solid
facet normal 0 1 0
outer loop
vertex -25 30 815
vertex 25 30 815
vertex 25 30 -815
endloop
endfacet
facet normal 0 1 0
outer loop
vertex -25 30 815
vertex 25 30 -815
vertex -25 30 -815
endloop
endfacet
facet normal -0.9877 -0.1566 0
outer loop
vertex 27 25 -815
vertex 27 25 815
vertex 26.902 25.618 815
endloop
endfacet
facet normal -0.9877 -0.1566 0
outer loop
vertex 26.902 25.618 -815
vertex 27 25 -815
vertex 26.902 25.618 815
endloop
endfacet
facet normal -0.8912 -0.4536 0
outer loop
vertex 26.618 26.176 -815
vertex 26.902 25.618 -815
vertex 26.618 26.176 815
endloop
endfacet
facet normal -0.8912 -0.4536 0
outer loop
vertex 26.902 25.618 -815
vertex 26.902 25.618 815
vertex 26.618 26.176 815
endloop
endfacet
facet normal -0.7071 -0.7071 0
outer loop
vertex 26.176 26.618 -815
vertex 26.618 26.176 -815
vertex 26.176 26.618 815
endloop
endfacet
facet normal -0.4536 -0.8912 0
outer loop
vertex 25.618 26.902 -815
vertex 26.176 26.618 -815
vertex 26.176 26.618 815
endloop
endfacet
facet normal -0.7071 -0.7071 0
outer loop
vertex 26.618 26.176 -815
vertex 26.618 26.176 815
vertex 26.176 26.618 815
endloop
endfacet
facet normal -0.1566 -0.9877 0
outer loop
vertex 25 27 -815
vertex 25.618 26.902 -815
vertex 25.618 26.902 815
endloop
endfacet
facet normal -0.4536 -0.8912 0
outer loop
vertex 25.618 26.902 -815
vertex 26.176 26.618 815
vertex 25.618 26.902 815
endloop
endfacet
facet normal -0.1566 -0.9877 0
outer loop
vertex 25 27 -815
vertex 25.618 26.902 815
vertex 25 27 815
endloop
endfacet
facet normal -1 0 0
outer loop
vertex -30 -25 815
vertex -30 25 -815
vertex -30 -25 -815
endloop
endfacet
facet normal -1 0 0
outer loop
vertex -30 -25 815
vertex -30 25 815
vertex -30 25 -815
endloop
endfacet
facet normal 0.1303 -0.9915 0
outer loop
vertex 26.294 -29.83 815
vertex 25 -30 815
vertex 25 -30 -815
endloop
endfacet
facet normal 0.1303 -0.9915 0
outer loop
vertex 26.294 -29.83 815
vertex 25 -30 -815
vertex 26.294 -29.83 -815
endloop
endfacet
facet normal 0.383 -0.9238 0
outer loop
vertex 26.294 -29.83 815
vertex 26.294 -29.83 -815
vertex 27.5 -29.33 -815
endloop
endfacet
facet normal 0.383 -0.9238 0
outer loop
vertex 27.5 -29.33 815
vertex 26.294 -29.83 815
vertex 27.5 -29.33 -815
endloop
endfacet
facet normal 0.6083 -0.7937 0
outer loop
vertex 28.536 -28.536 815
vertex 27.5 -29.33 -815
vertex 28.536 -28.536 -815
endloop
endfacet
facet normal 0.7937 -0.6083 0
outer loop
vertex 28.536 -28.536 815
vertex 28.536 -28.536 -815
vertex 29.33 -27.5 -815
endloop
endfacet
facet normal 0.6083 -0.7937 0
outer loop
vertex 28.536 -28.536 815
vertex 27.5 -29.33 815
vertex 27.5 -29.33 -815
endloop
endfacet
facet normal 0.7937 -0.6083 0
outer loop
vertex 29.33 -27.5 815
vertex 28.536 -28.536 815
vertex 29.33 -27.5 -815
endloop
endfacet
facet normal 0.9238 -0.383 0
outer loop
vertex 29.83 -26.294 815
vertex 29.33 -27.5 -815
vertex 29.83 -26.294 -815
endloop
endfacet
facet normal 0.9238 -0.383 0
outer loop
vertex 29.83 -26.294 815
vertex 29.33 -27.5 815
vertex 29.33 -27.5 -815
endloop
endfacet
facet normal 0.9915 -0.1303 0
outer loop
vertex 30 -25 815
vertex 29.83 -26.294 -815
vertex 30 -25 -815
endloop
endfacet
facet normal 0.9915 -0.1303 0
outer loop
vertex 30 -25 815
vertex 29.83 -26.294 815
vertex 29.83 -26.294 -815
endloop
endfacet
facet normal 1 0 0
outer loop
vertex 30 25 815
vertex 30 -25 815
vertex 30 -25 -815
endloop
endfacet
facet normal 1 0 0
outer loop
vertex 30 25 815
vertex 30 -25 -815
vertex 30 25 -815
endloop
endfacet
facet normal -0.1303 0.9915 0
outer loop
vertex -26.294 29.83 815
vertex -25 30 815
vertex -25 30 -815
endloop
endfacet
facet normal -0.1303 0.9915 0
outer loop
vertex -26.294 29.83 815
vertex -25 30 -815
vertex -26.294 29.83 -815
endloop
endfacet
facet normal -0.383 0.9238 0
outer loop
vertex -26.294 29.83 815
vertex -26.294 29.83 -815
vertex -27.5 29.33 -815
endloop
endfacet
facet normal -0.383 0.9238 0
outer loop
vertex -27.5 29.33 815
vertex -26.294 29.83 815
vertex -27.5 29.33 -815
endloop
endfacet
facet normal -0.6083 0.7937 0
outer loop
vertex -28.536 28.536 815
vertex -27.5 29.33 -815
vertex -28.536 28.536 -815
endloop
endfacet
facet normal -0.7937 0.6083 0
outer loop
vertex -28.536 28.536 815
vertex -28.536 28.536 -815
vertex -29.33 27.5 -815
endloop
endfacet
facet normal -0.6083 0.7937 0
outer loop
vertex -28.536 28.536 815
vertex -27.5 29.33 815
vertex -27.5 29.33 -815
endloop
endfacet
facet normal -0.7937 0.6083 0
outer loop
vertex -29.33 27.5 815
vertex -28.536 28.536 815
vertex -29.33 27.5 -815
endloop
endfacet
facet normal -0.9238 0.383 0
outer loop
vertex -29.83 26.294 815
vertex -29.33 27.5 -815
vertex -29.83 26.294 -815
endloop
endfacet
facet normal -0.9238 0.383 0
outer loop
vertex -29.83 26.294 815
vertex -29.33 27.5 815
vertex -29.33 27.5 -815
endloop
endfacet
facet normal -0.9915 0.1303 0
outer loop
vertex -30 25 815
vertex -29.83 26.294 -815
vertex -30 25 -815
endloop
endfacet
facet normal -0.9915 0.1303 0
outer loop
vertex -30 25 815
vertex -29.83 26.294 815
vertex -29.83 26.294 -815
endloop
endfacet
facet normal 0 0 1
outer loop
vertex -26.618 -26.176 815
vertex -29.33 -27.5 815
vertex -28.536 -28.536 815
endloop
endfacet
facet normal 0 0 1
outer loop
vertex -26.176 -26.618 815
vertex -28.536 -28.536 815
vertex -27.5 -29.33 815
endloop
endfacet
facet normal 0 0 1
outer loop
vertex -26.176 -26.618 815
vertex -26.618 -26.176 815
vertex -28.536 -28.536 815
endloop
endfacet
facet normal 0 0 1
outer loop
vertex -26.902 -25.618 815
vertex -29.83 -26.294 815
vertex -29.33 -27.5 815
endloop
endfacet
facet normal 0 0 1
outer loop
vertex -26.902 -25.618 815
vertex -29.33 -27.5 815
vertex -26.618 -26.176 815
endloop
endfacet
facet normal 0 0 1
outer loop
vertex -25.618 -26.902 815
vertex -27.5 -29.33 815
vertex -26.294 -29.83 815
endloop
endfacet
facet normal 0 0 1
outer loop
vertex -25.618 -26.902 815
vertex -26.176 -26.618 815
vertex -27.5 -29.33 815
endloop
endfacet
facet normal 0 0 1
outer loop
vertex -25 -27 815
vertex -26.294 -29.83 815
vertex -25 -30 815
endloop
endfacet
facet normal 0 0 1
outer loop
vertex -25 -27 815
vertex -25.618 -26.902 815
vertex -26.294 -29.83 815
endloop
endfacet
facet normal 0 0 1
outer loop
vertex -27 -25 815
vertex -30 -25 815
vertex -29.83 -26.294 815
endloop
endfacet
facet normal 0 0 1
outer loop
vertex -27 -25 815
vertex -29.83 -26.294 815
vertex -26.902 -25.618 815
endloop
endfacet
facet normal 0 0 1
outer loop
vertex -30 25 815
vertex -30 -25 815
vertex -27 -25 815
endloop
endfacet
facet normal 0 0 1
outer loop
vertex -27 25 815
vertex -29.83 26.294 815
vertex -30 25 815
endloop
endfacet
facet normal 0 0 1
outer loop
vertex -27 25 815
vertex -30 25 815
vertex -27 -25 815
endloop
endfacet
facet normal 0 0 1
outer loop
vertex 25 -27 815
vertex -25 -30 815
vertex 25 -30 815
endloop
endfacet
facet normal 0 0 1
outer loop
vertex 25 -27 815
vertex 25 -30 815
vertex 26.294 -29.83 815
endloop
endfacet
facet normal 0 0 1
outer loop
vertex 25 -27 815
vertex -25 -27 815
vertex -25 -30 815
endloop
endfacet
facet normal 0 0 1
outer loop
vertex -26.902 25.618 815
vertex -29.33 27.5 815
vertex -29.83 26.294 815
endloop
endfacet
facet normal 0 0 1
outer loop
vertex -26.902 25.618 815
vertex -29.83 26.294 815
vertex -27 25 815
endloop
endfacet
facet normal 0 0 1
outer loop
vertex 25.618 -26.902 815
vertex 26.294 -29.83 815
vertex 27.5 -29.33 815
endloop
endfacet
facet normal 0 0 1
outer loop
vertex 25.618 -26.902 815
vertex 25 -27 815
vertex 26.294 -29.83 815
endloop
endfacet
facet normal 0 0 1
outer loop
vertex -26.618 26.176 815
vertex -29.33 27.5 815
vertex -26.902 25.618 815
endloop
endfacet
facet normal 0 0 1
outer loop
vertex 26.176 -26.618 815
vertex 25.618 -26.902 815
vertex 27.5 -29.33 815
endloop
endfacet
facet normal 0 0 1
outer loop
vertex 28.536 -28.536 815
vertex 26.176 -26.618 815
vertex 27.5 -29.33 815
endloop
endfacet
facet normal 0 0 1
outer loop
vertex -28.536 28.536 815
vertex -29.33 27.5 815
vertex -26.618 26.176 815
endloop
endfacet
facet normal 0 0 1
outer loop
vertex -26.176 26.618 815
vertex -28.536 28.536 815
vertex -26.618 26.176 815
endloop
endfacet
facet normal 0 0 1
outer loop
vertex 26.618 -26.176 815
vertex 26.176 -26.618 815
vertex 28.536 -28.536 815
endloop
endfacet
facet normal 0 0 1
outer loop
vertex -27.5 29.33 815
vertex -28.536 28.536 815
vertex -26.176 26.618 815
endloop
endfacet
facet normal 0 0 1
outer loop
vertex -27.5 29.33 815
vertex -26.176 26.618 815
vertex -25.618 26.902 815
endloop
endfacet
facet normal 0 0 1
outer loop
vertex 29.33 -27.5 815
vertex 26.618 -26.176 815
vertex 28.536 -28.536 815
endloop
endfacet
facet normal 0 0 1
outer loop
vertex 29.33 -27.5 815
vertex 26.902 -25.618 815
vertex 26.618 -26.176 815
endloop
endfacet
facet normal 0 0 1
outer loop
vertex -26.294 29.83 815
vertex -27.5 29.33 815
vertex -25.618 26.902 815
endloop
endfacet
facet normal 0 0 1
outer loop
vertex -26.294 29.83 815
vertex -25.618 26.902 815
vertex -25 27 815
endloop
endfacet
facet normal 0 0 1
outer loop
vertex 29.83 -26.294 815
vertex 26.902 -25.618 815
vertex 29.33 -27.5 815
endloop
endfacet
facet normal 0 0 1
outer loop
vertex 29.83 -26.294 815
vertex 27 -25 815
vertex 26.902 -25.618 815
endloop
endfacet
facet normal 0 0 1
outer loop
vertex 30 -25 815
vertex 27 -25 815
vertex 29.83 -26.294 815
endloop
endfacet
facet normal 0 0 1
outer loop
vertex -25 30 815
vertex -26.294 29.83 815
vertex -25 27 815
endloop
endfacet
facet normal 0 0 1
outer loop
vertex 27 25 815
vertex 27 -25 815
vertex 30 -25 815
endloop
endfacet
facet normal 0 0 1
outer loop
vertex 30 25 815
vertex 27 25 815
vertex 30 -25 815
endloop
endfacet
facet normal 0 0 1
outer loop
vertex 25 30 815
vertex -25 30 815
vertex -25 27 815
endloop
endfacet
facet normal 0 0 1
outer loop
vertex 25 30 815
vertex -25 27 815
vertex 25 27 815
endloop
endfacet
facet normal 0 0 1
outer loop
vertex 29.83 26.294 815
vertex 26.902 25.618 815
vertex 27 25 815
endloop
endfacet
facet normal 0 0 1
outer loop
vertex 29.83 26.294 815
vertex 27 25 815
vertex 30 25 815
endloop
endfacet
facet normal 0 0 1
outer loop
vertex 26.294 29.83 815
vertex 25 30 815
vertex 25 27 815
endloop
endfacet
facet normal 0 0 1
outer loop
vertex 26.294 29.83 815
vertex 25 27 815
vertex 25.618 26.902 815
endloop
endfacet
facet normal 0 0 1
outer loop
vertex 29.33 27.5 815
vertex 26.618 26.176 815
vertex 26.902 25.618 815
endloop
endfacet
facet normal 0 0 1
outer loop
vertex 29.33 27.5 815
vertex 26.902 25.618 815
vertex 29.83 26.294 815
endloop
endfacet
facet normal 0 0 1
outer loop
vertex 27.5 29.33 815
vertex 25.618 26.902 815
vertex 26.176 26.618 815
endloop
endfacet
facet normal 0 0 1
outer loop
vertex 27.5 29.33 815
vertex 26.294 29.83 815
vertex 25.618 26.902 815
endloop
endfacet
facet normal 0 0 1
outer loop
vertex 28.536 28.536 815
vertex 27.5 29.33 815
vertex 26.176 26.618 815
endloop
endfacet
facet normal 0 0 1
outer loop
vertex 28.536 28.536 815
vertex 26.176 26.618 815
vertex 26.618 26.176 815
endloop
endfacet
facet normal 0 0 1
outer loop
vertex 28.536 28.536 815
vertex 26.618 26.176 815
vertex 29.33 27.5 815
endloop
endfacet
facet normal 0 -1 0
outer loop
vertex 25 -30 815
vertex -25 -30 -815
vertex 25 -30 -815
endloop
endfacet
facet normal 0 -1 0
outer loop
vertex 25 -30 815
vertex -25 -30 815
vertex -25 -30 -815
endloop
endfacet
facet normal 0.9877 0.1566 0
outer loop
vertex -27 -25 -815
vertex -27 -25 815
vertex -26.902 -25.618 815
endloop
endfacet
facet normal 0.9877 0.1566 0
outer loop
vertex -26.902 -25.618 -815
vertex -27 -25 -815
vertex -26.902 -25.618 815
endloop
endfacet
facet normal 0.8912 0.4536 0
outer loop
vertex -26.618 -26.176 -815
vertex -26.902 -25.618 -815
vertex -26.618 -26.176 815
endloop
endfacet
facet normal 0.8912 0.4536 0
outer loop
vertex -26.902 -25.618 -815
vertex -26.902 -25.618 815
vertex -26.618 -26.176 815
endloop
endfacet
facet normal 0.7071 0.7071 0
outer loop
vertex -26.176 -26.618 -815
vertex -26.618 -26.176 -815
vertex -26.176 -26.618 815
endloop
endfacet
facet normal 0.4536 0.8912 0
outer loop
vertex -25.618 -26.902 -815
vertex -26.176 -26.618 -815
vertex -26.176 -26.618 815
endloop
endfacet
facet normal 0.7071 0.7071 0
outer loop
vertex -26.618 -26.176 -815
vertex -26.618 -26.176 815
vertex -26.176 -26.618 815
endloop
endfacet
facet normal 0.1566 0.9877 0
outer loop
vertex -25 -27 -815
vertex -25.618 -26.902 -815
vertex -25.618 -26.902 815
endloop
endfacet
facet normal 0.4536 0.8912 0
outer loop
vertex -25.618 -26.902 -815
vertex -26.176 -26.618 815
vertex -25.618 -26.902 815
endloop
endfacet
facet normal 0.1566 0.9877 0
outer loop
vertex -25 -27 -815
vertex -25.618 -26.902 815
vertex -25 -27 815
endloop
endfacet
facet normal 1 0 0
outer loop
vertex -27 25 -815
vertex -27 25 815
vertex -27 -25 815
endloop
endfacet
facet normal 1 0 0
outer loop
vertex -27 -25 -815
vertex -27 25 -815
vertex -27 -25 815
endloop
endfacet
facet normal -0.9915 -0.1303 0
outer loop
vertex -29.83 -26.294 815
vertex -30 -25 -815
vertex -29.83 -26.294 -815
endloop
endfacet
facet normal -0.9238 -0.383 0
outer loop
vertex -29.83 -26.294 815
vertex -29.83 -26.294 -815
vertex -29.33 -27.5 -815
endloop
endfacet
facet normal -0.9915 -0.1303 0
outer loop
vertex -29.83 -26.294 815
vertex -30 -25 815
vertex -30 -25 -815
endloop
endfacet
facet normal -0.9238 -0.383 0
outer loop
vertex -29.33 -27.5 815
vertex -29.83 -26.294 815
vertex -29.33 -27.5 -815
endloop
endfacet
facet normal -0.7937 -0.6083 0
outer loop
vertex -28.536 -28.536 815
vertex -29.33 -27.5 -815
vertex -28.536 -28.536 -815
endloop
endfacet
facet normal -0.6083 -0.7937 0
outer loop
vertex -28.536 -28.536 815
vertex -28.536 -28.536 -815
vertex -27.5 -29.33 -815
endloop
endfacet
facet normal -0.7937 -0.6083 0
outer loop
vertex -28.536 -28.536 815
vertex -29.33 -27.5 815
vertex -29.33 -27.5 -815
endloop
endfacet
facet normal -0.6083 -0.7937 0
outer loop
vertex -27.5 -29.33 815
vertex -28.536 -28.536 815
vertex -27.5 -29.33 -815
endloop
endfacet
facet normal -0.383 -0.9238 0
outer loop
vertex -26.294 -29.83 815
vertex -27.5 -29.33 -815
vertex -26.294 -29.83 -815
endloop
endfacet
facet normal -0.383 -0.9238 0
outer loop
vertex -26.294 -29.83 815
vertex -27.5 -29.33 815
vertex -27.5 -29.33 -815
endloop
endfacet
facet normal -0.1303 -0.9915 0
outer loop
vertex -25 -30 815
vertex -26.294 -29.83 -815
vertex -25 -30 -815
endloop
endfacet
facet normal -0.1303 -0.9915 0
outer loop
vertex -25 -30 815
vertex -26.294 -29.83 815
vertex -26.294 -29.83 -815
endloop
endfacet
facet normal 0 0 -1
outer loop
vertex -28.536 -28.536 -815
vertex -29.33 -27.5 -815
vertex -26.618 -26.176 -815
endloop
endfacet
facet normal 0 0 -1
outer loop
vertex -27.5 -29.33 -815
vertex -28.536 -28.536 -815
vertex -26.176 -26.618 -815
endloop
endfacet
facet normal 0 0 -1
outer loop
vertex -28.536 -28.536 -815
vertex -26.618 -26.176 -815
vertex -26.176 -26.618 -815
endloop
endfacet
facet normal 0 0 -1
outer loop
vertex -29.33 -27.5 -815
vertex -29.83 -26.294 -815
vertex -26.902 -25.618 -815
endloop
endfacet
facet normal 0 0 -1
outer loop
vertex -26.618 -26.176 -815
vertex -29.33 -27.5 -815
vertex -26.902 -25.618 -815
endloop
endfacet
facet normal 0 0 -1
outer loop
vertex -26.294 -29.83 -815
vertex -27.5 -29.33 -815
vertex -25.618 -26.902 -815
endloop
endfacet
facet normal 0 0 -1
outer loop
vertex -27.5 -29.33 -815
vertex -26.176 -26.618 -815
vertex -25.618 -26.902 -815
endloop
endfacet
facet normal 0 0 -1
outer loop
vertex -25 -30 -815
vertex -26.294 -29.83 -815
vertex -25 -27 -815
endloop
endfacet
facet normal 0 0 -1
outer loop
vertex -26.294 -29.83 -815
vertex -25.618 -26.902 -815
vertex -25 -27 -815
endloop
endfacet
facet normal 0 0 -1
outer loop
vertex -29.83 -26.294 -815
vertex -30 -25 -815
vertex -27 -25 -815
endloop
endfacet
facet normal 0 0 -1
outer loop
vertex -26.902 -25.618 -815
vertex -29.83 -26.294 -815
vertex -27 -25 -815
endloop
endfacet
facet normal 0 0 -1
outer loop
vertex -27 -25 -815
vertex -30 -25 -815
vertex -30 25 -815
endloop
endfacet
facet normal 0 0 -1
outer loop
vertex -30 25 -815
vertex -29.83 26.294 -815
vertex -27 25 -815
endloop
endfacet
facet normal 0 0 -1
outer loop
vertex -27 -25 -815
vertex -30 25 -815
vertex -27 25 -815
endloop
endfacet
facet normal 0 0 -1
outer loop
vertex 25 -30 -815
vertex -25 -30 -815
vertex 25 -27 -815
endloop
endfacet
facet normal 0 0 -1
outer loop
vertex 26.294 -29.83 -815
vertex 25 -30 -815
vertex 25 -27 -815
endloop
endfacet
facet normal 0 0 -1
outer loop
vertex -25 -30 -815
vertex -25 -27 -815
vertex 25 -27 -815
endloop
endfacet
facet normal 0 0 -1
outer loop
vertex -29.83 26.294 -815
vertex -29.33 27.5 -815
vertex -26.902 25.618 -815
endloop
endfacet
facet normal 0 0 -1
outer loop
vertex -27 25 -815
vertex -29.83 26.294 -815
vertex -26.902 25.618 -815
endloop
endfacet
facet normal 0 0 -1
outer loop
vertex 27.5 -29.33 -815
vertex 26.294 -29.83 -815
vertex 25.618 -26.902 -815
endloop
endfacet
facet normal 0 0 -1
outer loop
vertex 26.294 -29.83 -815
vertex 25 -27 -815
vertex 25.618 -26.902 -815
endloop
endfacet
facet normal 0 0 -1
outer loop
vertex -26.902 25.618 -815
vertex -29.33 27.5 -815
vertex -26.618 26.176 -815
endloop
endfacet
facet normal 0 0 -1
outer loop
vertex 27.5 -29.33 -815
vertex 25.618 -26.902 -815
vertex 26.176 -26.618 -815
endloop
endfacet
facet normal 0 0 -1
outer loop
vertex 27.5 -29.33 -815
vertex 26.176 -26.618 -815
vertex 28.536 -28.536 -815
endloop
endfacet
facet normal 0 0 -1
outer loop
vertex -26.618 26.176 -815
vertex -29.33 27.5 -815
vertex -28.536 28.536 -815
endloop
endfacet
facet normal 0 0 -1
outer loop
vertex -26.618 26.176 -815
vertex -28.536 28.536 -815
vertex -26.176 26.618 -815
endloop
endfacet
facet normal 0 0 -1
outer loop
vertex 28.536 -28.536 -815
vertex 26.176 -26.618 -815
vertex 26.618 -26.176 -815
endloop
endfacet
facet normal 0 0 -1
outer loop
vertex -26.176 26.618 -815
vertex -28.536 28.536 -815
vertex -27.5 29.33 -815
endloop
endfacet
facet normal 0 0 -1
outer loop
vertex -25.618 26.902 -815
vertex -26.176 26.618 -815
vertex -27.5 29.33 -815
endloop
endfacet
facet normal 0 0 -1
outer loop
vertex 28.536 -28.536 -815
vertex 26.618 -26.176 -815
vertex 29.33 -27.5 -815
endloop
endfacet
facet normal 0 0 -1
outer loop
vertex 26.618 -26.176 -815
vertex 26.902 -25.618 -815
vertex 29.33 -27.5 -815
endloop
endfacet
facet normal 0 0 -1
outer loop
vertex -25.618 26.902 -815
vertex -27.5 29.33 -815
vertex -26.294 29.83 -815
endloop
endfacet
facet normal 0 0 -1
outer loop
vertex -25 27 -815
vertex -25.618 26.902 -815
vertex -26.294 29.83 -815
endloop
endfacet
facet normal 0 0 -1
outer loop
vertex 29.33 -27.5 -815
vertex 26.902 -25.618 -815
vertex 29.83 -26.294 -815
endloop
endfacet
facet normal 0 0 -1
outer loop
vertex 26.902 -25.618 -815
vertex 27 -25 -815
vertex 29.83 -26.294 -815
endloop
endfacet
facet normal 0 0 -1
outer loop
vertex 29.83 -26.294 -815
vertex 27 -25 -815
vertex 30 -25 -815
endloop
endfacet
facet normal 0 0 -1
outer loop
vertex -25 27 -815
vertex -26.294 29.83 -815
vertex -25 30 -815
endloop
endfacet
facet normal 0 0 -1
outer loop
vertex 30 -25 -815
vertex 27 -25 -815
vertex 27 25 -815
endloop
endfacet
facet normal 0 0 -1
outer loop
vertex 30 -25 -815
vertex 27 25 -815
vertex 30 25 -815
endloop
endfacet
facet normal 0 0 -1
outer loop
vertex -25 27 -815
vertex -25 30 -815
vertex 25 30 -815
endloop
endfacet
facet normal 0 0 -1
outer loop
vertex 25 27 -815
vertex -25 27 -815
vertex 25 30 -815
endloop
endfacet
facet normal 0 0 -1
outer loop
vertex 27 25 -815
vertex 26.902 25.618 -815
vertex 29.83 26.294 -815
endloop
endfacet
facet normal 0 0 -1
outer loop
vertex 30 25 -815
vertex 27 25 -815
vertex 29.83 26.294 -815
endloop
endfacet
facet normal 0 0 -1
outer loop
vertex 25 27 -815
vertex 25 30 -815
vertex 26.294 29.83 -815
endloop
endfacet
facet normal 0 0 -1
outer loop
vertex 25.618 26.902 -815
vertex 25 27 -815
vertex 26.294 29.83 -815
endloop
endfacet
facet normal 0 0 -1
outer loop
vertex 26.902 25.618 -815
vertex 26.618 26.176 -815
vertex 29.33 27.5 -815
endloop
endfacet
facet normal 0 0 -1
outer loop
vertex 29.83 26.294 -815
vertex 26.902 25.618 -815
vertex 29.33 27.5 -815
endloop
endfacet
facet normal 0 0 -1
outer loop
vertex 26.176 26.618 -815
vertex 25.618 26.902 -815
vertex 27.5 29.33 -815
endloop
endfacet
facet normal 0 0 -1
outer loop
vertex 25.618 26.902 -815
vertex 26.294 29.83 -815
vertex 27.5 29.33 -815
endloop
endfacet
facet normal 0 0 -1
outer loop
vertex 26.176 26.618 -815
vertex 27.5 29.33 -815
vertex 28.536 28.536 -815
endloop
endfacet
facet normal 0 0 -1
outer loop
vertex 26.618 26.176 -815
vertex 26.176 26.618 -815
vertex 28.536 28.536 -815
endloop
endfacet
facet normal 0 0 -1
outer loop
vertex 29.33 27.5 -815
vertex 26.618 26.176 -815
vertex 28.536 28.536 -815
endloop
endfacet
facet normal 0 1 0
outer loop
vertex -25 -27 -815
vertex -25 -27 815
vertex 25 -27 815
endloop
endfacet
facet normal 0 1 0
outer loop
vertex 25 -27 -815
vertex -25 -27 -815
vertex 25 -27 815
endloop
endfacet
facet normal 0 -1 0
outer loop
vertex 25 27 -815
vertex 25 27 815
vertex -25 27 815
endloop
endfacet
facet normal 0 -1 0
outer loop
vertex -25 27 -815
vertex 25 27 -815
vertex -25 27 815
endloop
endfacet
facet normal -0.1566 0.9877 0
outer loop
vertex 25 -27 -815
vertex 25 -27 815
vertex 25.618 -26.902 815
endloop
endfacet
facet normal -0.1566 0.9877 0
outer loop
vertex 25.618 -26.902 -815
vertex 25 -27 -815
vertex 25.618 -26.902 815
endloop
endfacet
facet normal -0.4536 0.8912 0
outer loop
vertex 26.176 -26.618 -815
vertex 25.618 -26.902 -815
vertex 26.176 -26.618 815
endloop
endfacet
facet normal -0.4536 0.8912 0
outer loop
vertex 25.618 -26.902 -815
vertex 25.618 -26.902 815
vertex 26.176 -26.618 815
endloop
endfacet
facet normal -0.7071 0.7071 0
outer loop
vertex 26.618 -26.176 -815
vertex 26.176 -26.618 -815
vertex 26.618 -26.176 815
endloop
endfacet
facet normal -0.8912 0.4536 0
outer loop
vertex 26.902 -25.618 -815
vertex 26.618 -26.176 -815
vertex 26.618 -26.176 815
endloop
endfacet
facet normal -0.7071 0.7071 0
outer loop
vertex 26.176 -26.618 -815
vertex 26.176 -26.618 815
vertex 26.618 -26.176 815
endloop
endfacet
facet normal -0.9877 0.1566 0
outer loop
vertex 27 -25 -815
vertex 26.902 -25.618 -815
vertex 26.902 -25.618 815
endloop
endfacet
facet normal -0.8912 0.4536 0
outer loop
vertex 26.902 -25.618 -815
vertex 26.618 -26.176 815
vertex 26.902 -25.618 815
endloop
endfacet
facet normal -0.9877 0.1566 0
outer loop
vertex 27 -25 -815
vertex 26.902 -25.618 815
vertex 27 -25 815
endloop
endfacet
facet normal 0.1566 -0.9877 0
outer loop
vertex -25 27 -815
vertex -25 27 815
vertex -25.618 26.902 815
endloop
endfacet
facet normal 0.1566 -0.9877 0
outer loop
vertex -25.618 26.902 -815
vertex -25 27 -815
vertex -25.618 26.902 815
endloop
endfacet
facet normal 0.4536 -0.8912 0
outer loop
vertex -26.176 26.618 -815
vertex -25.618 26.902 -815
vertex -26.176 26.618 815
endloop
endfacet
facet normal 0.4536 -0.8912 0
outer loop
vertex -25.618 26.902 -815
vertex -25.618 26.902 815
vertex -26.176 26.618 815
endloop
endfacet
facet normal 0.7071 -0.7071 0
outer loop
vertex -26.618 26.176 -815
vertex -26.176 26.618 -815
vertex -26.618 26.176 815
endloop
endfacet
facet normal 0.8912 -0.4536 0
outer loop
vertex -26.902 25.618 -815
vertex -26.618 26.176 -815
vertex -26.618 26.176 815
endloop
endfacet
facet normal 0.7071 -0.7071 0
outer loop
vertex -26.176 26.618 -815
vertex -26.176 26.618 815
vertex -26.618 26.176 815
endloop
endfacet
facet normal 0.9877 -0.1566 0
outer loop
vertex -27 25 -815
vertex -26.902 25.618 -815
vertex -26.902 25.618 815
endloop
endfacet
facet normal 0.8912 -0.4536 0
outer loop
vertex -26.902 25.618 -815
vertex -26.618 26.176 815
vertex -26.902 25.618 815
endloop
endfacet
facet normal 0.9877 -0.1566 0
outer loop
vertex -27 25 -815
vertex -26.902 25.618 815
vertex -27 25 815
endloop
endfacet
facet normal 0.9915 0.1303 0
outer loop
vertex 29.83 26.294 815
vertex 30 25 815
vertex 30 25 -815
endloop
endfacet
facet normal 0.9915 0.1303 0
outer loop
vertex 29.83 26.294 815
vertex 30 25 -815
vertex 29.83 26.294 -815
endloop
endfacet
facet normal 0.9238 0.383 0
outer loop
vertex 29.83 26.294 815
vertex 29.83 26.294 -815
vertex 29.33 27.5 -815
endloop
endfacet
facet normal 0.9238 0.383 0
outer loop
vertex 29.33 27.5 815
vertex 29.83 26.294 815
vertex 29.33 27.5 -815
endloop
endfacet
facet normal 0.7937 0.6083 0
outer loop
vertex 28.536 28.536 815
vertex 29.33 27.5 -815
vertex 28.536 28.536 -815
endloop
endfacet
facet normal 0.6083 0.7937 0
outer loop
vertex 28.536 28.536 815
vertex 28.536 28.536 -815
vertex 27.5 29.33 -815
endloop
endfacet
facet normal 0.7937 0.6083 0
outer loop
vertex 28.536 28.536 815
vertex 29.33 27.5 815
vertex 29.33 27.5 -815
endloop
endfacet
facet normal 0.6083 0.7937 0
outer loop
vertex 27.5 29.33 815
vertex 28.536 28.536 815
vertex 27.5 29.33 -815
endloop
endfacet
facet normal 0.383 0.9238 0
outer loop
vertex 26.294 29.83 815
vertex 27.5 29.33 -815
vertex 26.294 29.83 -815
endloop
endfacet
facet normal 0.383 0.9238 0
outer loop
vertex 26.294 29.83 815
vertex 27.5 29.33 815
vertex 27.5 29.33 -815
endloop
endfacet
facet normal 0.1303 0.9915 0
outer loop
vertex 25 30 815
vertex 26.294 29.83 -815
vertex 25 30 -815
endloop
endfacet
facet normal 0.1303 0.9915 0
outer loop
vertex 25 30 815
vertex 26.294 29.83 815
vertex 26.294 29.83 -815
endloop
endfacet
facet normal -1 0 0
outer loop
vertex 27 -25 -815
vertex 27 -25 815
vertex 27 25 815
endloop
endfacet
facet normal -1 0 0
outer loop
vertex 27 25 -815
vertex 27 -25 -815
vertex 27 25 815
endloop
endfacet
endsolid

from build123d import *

# Parameters (mm, degrees)
EXTRUDE_1_DEPTH = 815
SHELL_1_T       = -3


with BuildPart() as part:
    # Эскиз1 → Бобышка-Вытянуть1 (new, symmetric)
    with BuildSketch(Plane.XY):
        with BuildLine():
            Line((-25, -30), (25, -30))
            ThreePointArc((25, -30), (28.535533906, -28.535533906), (30, -25))
            Line((30, -25), (30, 25))
            ThreePointArc((30, 25), (28.535533906, 28.535533906), (25, 30))
            Line((25, 30), (-25, 30))
            ThreePointArc((-25, 30), (-28.535533906, 28.535533906), (-30, 25))
            Line((-30, 25), (-30, -25))
            ThreePointArc((-30, -25), (-28.535533906, -28.535533906), (-25, -30))
        make_face()
    extrude(amount=EXTRUDE_1_DEPTH, both=True)

    # Оболочка1
    shell_1_openings = [part.faces().sort_by_distance(p)[0] for p in [
        (0, 0, 815),
        (0, 0, -815),
    ]]
    offset(amount=SHELL_1_T, openings=shell_1_openings, kind=Kind.INTERSECTION)


solid = part.part
